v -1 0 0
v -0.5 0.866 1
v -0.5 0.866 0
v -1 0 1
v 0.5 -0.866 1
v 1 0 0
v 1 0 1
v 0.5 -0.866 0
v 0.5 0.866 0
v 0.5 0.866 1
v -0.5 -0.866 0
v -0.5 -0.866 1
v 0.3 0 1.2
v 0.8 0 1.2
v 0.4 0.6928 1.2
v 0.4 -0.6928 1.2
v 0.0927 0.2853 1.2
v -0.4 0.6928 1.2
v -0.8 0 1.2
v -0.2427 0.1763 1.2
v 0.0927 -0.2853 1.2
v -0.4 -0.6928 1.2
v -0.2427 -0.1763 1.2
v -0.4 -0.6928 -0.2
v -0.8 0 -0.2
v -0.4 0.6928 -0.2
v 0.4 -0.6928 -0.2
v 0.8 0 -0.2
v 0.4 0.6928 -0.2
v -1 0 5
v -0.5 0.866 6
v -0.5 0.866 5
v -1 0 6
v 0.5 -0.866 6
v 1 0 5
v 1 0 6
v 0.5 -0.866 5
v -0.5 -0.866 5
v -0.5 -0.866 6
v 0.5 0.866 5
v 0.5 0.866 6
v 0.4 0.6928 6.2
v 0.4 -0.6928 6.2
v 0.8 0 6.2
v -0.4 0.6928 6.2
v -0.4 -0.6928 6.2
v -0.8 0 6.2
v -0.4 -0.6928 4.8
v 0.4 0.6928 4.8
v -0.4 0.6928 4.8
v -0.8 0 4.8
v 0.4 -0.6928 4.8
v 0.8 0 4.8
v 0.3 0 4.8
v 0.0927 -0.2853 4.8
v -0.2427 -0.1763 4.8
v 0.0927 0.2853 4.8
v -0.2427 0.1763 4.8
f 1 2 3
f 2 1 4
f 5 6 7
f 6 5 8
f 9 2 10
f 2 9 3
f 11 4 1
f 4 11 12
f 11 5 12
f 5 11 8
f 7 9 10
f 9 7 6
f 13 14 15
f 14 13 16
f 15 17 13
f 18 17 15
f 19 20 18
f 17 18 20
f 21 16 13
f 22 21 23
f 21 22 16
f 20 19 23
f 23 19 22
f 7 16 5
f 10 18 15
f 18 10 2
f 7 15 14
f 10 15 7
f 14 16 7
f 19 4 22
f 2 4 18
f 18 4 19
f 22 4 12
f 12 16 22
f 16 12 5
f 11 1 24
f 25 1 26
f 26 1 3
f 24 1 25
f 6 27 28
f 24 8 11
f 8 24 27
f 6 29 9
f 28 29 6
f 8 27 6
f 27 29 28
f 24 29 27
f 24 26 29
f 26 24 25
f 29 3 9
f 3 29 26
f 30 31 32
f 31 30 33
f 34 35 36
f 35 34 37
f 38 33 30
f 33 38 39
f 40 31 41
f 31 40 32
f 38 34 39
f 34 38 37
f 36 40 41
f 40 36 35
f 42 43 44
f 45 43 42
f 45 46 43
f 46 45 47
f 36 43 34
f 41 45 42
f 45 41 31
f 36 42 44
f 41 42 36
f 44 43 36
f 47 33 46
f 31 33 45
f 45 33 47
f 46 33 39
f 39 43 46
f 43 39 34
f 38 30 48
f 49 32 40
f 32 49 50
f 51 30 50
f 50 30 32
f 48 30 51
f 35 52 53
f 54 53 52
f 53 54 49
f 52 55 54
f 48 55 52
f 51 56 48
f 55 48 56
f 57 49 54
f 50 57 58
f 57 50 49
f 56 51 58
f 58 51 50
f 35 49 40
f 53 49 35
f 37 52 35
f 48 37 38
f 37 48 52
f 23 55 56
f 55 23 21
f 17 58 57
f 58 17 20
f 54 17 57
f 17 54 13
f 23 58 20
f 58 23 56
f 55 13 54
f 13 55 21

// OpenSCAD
module Weights_01(){

    module regular_polygon(order = 6, r=1){
         angles=[ for (i = [0:order-1]) i*(360/order) ];
         coords=[ for (th=angles) [r*cos(th), r*sin(th)] ];
         polygon(coords);
    }
     
     
    module weight(){ 
    color("#a8b0b2")
    linear_extrude(height= 1)
    regular_polygon(order = 6);
     
    translate([0,0,1])
    color("#a8b0b2")
    linear_extrude(height= 0.2, scale = 0.8)
    regular_polygon(order = 6);
     
    translate([0,0,0])
    rotate([0,180,0])
    color("#a8b0b2")
    linear_extrude(height= 0.2, scale = 0.8)
    regular_polygon(order = 6);
    }
     
     weight(); 
     translate([0,0,5])
     weight();
     
     color("#3b3b3b")
     cylinder(5,0.3,0.3);
 
}
 
Weights_01();

// Written by Nicolì Angelo (Gengio) 2024: 
// MIT License

//Permission is hereby granted, free of charge, to any person obtaining a copy of this software and associated documentation files (the "Software"), to deal in the Software without restriction, including without limitation the rights to use, copy, modify, merge, publish, distribute, sublicense, and/or sell copies of the Software, and to permit persons to whom the Software is furnished to do so, subject to the following conditions:

//The above copyright notice and this permission notice shall be included in all copies or substantial portions of the Software.

//THE SOFTWARE IS PROVIDED "AS IS", WITHOUT WARRANTY OF ANY KIND, EXPRESS OR IMPLIED, INCLUDING BUT NOT LIMITED TO THE WARRANTIES OF MERCHANTABILITY, FITNESS FOR A PARTICULAR PURPOSE AND NONINFRINGEMENT. IN NO EVENT SHALL THE AUTHORS OR COPYRIGHT HOLDERS BE LIABLE FOR ANY CLAIM, DAMAGES OR OTHER LIABILITY, WHETHER IN AN ACTION OF CONTRACT, TORT OR OTHERWISE, ARISING FROM, OUT OF OR IN CONNECTION WITH THE SOFTWARE OR THE USE OR OTHER DEALINGS IN THE SOFTWARE.
